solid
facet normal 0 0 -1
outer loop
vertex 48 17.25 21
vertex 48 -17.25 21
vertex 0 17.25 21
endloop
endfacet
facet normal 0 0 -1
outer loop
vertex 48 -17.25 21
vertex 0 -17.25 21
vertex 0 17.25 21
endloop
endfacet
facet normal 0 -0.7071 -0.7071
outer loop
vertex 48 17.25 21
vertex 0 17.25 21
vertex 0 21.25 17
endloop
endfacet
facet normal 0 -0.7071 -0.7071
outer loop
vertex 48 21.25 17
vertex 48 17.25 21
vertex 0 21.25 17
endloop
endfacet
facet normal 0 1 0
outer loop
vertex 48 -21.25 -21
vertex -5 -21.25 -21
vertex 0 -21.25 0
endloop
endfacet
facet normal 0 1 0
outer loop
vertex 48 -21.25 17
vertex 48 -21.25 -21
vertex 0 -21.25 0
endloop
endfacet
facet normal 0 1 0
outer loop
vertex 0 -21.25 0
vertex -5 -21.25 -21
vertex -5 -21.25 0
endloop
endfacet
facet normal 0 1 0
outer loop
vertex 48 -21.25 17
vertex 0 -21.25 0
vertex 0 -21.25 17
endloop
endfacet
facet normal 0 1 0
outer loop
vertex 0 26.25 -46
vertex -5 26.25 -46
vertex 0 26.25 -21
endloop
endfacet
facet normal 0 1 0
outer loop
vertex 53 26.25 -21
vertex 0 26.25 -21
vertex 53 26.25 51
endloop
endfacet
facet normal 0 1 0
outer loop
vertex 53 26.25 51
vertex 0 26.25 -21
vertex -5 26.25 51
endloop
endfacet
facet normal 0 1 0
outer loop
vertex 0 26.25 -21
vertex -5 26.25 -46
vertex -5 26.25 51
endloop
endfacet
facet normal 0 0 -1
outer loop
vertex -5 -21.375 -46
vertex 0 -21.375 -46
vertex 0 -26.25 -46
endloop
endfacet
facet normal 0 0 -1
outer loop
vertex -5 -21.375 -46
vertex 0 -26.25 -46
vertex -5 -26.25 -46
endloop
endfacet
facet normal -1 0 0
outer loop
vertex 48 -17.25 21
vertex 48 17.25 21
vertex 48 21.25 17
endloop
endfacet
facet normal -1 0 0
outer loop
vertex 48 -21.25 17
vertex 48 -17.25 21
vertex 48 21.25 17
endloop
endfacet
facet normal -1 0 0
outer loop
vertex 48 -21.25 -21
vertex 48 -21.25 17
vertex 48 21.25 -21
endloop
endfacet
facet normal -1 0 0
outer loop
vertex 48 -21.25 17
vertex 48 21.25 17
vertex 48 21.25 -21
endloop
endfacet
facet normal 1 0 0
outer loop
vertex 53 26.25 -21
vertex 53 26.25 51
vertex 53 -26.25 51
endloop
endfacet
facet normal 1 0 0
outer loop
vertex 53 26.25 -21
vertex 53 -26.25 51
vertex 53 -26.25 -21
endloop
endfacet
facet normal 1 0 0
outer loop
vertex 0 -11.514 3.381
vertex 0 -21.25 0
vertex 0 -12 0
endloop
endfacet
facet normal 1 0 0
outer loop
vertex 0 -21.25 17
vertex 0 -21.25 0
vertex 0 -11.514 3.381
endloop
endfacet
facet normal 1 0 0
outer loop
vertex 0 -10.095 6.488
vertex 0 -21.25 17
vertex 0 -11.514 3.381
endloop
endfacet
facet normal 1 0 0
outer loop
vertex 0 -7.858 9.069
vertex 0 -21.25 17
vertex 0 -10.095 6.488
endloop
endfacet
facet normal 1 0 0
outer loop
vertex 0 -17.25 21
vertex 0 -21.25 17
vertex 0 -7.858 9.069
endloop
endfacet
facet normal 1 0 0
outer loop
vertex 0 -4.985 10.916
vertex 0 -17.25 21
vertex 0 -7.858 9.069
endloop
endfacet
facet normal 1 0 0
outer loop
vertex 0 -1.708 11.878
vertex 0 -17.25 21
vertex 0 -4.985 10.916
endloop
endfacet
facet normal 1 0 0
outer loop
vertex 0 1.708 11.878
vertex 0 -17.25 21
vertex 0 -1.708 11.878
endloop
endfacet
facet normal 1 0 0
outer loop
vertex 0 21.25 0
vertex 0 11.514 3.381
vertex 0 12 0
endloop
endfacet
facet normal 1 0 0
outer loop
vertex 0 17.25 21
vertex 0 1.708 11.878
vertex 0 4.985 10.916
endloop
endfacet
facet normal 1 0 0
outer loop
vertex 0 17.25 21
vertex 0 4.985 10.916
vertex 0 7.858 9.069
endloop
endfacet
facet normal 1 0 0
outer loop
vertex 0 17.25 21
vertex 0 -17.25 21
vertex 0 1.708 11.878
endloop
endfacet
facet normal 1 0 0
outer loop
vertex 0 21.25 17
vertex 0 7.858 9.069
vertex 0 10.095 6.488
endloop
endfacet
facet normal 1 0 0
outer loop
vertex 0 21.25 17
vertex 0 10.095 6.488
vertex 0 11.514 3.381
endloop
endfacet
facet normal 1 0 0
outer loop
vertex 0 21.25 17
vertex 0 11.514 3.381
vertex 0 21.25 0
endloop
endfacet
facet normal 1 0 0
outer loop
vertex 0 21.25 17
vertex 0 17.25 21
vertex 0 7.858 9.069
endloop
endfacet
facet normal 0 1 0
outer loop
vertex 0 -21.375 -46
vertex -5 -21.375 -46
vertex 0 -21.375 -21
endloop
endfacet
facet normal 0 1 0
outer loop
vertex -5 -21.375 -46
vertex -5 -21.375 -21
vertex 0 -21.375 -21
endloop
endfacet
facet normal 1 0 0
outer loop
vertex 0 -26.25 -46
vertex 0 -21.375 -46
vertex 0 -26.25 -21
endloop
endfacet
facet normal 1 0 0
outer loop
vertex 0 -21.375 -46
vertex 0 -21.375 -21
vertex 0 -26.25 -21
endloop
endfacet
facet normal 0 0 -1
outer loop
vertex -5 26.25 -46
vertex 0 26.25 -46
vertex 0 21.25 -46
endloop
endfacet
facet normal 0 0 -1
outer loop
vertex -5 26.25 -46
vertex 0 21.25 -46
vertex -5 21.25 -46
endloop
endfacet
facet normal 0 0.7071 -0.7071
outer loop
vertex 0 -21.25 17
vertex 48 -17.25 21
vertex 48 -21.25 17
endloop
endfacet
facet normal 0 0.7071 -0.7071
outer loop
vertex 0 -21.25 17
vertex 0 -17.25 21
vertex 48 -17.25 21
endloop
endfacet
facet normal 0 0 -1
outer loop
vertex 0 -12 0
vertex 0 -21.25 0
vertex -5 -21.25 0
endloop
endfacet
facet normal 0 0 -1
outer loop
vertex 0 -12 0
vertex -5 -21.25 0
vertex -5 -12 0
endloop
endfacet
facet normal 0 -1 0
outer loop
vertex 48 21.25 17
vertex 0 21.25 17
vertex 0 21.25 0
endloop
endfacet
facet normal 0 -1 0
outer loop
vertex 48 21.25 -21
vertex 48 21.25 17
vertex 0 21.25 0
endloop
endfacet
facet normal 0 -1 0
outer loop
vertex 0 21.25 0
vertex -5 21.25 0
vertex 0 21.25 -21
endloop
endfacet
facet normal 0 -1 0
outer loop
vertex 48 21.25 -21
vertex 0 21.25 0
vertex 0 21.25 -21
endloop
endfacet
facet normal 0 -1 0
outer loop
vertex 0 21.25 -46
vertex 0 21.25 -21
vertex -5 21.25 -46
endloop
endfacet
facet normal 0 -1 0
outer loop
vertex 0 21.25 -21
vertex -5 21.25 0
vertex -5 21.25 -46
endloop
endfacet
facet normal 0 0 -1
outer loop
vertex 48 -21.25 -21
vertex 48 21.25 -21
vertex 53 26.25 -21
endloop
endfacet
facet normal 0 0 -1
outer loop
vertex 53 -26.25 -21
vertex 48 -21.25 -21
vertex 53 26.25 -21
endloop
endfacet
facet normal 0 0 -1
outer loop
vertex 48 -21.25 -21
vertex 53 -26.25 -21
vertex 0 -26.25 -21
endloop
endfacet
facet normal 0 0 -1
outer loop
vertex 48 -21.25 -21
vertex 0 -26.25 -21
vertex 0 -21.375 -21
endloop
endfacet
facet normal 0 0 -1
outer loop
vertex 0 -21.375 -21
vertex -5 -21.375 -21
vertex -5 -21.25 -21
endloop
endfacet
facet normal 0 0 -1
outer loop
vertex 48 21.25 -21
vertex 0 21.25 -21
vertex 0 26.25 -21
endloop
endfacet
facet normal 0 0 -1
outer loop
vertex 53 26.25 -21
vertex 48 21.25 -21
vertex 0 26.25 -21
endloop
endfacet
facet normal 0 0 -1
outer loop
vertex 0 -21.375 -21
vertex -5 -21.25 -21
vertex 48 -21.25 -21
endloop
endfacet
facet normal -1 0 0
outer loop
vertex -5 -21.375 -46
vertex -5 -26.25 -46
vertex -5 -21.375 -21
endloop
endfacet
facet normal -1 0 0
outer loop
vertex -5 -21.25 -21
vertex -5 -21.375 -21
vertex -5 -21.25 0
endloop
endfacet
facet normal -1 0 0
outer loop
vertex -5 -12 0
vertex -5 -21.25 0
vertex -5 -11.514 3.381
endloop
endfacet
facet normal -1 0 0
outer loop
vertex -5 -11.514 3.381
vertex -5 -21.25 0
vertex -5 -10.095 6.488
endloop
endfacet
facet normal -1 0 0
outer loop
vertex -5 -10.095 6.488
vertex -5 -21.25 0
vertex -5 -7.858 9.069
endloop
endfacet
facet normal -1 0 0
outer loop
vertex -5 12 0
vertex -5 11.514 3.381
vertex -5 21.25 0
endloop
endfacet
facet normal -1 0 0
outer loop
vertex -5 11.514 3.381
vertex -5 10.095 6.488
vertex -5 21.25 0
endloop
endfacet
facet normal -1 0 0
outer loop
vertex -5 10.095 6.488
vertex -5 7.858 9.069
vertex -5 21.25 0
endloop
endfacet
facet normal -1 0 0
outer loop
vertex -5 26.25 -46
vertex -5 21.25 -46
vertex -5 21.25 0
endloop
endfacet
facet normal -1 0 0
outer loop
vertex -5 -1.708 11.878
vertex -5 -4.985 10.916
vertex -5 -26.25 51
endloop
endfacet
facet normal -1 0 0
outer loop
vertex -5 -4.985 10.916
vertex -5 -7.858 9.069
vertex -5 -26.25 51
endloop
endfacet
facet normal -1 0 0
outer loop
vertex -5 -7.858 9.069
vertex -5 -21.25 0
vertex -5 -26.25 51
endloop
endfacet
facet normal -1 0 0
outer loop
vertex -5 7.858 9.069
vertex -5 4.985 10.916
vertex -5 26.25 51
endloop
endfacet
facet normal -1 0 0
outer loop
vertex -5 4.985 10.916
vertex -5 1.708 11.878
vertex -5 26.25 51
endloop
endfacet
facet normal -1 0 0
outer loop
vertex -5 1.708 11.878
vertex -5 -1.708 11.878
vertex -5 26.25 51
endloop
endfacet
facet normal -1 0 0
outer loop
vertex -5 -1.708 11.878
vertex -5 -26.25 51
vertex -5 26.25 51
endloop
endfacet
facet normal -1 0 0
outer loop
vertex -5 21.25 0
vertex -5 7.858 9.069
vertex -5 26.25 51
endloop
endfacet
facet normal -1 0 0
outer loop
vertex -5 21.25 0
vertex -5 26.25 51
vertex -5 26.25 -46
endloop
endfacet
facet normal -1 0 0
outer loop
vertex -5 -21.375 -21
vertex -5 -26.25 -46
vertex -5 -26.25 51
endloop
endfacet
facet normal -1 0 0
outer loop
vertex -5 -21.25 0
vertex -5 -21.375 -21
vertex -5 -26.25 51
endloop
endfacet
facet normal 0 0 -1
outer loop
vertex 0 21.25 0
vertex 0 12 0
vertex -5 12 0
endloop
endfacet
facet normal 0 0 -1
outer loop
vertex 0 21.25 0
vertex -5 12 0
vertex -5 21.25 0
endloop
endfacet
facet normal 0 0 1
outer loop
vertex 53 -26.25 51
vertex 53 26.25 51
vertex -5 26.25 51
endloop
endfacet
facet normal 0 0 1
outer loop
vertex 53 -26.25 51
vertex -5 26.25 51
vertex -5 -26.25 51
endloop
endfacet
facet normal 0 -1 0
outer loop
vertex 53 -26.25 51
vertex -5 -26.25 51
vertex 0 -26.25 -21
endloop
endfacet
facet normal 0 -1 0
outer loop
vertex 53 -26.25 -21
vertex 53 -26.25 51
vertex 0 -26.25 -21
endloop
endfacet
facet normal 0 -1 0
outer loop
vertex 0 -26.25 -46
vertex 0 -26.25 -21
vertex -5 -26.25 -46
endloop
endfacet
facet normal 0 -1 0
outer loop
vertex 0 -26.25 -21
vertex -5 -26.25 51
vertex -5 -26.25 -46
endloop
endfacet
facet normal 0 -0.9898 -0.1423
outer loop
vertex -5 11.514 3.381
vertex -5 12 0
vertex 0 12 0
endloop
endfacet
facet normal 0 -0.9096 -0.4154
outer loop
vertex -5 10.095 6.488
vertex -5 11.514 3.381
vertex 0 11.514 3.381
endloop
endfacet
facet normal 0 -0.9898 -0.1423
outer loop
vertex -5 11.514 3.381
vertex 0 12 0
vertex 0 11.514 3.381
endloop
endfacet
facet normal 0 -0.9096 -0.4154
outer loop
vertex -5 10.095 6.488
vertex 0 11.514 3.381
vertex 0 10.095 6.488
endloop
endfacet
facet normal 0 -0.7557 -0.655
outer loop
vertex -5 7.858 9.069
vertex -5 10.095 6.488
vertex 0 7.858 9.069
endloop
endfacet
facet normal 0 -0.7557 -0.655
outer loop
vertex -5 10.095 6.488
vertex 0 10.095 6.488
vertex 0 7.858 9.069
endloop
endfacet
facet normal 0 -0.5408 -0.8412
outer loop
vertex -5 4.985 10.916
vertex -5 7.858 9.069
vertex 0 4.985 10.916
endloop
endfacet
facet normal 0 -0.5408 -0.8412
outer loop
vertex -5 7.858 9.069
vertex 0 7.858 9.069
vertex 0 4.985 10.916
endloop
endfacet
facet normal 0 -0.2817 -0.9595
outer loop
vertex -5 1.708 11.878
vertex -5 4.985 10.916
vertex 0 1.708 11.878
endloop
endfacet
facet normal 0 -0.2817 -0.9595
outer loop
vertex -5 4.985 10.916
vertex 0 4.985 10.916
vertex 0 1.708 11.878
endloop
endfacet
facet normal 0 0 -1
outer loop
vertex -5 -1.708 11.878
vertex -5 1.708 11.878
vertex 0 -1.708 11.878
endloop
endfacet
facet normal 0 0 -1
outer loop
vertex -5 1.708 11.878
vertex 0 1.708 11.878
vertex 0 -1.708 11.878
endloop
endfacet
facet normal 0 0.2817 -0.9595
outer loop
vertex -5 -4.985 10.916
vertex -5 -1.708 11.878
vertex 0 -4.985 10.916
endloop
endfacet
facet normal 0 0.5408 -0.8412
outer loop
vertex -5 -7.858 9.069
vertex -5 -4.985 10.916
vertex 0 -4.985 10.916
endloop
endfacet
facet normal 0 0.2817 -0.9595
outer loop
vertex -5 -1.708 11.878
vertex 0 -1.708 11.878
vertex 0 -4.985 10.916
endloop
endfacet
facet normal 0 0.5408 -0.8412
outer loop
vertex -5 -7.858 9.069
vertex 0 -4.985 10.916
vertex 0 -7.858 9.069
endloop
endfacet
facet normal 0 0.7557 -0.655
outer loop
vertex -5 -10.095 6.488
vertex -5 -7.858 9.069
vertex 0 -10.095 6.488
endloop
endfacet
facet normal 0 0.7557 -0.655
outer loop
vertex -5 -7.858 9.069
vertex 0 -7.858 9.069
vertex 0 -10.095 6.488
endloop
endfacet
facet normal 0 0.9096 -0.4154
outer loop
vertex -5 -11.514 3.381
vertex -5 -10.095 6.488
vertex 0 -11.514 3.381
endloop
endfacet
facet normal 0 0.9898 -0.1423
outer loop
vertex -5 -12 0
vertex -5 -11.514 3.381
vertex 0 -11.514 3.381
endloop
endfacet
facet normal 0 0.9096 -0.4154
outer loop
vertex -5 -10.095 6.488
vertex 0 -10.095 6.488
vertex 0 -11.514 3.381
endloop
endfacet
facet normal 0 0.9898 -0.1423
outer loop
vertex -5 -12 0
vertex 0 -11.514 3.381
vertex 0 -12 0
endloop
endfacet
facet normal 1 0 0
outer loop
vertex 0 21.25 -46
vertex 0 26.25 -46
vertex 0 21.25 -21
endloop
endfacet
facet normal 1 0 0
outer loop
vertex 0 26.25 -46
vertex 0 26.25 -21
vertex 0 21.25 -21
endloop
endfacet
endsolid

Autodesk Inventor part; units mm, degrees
ref_plane "YZ Plane" through (0, 0, 0) normal (1, 0, 0) x (0, 1, 0)
ref_plane "XZ Plane" through (0, 0, 0) normal (0, 1, 0) x (-1, 0, 0)
ref_plane "XY Plane" through (0, 0, 0) normal (0, 0, 1) x (1, 0, 0)
sketch "Sketch1" plane through (0, 0, 0) normal (1, 0, 0) x (0, 1, 0)
  line L0 (21.25, -21) -> (-21.25, -21)
  line L1 (-21.25, -21) -> (-21.25, 21)
  line L2 (-21.25, 21) -> (21.25, 21)
  line L3 (21.25, 21) -> (21.25, -21)
  line L4 (21.25, -21) -> (-21.25, 21) construction
  line L5 (-21.25, -21) -> (21.25, 21) construction
  line L6 (-26.25, 26) -> (26.25, 26)
  line L7 (26.25, 26) -> (26.25, -26)
  line L8 (26.25, -26) -> (-26.25, -26)
  line L9 (-26.25, -26) -> (-26.25, 26)
  line L10 (-26.25, 26) -> (26.25, -26) construction
  line L11 (26.25, 26) -> (-26.25, -26) construction
  line L12 (17.25, 21) -> (21.25, 17)
  line L13 (-26.25, 0) -> (26.25, 0)
  line L14 (0, 26) -> (0, -26)
  line L15 (21.25, -21) -> (-21.25, 21) construction
  line L16 (-17.25, 21) -> (-21.25, 17)
  line L17 (21.25, -21) -> (26.25, -21)
  line L18 (-21.25, -21) -> (-26.25, -21)
  circle A0 centre (0, 0) radius 12
  line L19 (-26.25, 26) -> (26.25, 26)
  line L20 (26.25, 26) -> (26.25, 51)
  line L21 (26.25, 51) -> (-26.25, 51)
  line L22 (-26.25, 51) -> (-26.25, 26)
  point P0 (-21.25, 17)
  point P1 (-17.25, 21)
  point P2 (-21.25, 0)
  point P3 (-12, 0)
  point P4 (12, 0)
  point P5 (21.25, 0)
  dimension "d0" = 42.5
  dimension "d1" = 42
  dimension "d2" = 5
  dimension "d3" = 5
  dimension "d4" = 4
  dimension "d5" = 4
  dimension "d8" = 24
  dimension "d15" = 25
extrude "Extrusion1" add sketch "Sketch1" along normal blind 48 contours L3 L13 L7 L17 | L3 L2 L14 L6 L7 L13 | L18 L9 L13 L1 | L12 L2 L3 | L13 L9 L6 L14 L2 L1 | L6 L22 L21 L20 | L1 L2 L16
extrude "Extrusion2" add sketch "Sketch1" against normal blind 5 contours L3 L13 L7 L17 | L13 A0 L14 L2 L12 L3 | L3 L2 L14 L6 L7 L13 | L18 L9 L13 L1 | L12 L2 L3 | L13 L9 L6 L14 L2 L1 | L1 L16 L2 L14 A0 L13 | L6 L22 L21 L20 | L1 L2 L16
sketch "Sketch2" plane through (48, 0, 0) normal (1, 0, 0) x (0, 0, -1)
  line L0 (21, 26.25) -> (-51, 26.25)
  line L1 (-51, 26.25) -> (-51, -26.25)
  line L2 (-51, -26.25) -> (21, -26.25)
  line L3 (21, -26.25) -> (21, 26.25)
  point P0 (0, 0)
  point P1 (-26, -26.25)
extrude "Extrusion3" add sketch "Sketch2" along normal blind 5
sketch "Sketch4" plane through (-5, -26.25, -21) normal (0, 0, -1) x (-1, 0, 0)
  line L0 (0, 52.5) -> (0, 47.5) projected
  line L1 (-5, 47.5) -> (-53, 47.5) projected
  line L2 (0, 52.5) -> (-5, 52.5)
  line L3 (-5, 52.5) -> (-5, 47.5)
  line L4 (-5, 47.5) -> (0, 47.5)
  line L5 (0, 47.5) -> (0, 52.5)
  line L6 (0, 0) -> (0, 52.5) projected
  line L7 (0, 0) -> (-58, 0) projected
  line L8 (0, 4.8747) -> (-5, 4.8747)
  line L9 (-5, 4.8747) -> (-5, 0)
  line L10 (-5, 0) -> (0, 0)
  line L11 (0, 0) -> (0, 4.8747)
  point P0 (-5, 26.25)
extrude "Extrusion5" add sketch "Sketch4" along normal blind 25
properties part number "motor_mount"
